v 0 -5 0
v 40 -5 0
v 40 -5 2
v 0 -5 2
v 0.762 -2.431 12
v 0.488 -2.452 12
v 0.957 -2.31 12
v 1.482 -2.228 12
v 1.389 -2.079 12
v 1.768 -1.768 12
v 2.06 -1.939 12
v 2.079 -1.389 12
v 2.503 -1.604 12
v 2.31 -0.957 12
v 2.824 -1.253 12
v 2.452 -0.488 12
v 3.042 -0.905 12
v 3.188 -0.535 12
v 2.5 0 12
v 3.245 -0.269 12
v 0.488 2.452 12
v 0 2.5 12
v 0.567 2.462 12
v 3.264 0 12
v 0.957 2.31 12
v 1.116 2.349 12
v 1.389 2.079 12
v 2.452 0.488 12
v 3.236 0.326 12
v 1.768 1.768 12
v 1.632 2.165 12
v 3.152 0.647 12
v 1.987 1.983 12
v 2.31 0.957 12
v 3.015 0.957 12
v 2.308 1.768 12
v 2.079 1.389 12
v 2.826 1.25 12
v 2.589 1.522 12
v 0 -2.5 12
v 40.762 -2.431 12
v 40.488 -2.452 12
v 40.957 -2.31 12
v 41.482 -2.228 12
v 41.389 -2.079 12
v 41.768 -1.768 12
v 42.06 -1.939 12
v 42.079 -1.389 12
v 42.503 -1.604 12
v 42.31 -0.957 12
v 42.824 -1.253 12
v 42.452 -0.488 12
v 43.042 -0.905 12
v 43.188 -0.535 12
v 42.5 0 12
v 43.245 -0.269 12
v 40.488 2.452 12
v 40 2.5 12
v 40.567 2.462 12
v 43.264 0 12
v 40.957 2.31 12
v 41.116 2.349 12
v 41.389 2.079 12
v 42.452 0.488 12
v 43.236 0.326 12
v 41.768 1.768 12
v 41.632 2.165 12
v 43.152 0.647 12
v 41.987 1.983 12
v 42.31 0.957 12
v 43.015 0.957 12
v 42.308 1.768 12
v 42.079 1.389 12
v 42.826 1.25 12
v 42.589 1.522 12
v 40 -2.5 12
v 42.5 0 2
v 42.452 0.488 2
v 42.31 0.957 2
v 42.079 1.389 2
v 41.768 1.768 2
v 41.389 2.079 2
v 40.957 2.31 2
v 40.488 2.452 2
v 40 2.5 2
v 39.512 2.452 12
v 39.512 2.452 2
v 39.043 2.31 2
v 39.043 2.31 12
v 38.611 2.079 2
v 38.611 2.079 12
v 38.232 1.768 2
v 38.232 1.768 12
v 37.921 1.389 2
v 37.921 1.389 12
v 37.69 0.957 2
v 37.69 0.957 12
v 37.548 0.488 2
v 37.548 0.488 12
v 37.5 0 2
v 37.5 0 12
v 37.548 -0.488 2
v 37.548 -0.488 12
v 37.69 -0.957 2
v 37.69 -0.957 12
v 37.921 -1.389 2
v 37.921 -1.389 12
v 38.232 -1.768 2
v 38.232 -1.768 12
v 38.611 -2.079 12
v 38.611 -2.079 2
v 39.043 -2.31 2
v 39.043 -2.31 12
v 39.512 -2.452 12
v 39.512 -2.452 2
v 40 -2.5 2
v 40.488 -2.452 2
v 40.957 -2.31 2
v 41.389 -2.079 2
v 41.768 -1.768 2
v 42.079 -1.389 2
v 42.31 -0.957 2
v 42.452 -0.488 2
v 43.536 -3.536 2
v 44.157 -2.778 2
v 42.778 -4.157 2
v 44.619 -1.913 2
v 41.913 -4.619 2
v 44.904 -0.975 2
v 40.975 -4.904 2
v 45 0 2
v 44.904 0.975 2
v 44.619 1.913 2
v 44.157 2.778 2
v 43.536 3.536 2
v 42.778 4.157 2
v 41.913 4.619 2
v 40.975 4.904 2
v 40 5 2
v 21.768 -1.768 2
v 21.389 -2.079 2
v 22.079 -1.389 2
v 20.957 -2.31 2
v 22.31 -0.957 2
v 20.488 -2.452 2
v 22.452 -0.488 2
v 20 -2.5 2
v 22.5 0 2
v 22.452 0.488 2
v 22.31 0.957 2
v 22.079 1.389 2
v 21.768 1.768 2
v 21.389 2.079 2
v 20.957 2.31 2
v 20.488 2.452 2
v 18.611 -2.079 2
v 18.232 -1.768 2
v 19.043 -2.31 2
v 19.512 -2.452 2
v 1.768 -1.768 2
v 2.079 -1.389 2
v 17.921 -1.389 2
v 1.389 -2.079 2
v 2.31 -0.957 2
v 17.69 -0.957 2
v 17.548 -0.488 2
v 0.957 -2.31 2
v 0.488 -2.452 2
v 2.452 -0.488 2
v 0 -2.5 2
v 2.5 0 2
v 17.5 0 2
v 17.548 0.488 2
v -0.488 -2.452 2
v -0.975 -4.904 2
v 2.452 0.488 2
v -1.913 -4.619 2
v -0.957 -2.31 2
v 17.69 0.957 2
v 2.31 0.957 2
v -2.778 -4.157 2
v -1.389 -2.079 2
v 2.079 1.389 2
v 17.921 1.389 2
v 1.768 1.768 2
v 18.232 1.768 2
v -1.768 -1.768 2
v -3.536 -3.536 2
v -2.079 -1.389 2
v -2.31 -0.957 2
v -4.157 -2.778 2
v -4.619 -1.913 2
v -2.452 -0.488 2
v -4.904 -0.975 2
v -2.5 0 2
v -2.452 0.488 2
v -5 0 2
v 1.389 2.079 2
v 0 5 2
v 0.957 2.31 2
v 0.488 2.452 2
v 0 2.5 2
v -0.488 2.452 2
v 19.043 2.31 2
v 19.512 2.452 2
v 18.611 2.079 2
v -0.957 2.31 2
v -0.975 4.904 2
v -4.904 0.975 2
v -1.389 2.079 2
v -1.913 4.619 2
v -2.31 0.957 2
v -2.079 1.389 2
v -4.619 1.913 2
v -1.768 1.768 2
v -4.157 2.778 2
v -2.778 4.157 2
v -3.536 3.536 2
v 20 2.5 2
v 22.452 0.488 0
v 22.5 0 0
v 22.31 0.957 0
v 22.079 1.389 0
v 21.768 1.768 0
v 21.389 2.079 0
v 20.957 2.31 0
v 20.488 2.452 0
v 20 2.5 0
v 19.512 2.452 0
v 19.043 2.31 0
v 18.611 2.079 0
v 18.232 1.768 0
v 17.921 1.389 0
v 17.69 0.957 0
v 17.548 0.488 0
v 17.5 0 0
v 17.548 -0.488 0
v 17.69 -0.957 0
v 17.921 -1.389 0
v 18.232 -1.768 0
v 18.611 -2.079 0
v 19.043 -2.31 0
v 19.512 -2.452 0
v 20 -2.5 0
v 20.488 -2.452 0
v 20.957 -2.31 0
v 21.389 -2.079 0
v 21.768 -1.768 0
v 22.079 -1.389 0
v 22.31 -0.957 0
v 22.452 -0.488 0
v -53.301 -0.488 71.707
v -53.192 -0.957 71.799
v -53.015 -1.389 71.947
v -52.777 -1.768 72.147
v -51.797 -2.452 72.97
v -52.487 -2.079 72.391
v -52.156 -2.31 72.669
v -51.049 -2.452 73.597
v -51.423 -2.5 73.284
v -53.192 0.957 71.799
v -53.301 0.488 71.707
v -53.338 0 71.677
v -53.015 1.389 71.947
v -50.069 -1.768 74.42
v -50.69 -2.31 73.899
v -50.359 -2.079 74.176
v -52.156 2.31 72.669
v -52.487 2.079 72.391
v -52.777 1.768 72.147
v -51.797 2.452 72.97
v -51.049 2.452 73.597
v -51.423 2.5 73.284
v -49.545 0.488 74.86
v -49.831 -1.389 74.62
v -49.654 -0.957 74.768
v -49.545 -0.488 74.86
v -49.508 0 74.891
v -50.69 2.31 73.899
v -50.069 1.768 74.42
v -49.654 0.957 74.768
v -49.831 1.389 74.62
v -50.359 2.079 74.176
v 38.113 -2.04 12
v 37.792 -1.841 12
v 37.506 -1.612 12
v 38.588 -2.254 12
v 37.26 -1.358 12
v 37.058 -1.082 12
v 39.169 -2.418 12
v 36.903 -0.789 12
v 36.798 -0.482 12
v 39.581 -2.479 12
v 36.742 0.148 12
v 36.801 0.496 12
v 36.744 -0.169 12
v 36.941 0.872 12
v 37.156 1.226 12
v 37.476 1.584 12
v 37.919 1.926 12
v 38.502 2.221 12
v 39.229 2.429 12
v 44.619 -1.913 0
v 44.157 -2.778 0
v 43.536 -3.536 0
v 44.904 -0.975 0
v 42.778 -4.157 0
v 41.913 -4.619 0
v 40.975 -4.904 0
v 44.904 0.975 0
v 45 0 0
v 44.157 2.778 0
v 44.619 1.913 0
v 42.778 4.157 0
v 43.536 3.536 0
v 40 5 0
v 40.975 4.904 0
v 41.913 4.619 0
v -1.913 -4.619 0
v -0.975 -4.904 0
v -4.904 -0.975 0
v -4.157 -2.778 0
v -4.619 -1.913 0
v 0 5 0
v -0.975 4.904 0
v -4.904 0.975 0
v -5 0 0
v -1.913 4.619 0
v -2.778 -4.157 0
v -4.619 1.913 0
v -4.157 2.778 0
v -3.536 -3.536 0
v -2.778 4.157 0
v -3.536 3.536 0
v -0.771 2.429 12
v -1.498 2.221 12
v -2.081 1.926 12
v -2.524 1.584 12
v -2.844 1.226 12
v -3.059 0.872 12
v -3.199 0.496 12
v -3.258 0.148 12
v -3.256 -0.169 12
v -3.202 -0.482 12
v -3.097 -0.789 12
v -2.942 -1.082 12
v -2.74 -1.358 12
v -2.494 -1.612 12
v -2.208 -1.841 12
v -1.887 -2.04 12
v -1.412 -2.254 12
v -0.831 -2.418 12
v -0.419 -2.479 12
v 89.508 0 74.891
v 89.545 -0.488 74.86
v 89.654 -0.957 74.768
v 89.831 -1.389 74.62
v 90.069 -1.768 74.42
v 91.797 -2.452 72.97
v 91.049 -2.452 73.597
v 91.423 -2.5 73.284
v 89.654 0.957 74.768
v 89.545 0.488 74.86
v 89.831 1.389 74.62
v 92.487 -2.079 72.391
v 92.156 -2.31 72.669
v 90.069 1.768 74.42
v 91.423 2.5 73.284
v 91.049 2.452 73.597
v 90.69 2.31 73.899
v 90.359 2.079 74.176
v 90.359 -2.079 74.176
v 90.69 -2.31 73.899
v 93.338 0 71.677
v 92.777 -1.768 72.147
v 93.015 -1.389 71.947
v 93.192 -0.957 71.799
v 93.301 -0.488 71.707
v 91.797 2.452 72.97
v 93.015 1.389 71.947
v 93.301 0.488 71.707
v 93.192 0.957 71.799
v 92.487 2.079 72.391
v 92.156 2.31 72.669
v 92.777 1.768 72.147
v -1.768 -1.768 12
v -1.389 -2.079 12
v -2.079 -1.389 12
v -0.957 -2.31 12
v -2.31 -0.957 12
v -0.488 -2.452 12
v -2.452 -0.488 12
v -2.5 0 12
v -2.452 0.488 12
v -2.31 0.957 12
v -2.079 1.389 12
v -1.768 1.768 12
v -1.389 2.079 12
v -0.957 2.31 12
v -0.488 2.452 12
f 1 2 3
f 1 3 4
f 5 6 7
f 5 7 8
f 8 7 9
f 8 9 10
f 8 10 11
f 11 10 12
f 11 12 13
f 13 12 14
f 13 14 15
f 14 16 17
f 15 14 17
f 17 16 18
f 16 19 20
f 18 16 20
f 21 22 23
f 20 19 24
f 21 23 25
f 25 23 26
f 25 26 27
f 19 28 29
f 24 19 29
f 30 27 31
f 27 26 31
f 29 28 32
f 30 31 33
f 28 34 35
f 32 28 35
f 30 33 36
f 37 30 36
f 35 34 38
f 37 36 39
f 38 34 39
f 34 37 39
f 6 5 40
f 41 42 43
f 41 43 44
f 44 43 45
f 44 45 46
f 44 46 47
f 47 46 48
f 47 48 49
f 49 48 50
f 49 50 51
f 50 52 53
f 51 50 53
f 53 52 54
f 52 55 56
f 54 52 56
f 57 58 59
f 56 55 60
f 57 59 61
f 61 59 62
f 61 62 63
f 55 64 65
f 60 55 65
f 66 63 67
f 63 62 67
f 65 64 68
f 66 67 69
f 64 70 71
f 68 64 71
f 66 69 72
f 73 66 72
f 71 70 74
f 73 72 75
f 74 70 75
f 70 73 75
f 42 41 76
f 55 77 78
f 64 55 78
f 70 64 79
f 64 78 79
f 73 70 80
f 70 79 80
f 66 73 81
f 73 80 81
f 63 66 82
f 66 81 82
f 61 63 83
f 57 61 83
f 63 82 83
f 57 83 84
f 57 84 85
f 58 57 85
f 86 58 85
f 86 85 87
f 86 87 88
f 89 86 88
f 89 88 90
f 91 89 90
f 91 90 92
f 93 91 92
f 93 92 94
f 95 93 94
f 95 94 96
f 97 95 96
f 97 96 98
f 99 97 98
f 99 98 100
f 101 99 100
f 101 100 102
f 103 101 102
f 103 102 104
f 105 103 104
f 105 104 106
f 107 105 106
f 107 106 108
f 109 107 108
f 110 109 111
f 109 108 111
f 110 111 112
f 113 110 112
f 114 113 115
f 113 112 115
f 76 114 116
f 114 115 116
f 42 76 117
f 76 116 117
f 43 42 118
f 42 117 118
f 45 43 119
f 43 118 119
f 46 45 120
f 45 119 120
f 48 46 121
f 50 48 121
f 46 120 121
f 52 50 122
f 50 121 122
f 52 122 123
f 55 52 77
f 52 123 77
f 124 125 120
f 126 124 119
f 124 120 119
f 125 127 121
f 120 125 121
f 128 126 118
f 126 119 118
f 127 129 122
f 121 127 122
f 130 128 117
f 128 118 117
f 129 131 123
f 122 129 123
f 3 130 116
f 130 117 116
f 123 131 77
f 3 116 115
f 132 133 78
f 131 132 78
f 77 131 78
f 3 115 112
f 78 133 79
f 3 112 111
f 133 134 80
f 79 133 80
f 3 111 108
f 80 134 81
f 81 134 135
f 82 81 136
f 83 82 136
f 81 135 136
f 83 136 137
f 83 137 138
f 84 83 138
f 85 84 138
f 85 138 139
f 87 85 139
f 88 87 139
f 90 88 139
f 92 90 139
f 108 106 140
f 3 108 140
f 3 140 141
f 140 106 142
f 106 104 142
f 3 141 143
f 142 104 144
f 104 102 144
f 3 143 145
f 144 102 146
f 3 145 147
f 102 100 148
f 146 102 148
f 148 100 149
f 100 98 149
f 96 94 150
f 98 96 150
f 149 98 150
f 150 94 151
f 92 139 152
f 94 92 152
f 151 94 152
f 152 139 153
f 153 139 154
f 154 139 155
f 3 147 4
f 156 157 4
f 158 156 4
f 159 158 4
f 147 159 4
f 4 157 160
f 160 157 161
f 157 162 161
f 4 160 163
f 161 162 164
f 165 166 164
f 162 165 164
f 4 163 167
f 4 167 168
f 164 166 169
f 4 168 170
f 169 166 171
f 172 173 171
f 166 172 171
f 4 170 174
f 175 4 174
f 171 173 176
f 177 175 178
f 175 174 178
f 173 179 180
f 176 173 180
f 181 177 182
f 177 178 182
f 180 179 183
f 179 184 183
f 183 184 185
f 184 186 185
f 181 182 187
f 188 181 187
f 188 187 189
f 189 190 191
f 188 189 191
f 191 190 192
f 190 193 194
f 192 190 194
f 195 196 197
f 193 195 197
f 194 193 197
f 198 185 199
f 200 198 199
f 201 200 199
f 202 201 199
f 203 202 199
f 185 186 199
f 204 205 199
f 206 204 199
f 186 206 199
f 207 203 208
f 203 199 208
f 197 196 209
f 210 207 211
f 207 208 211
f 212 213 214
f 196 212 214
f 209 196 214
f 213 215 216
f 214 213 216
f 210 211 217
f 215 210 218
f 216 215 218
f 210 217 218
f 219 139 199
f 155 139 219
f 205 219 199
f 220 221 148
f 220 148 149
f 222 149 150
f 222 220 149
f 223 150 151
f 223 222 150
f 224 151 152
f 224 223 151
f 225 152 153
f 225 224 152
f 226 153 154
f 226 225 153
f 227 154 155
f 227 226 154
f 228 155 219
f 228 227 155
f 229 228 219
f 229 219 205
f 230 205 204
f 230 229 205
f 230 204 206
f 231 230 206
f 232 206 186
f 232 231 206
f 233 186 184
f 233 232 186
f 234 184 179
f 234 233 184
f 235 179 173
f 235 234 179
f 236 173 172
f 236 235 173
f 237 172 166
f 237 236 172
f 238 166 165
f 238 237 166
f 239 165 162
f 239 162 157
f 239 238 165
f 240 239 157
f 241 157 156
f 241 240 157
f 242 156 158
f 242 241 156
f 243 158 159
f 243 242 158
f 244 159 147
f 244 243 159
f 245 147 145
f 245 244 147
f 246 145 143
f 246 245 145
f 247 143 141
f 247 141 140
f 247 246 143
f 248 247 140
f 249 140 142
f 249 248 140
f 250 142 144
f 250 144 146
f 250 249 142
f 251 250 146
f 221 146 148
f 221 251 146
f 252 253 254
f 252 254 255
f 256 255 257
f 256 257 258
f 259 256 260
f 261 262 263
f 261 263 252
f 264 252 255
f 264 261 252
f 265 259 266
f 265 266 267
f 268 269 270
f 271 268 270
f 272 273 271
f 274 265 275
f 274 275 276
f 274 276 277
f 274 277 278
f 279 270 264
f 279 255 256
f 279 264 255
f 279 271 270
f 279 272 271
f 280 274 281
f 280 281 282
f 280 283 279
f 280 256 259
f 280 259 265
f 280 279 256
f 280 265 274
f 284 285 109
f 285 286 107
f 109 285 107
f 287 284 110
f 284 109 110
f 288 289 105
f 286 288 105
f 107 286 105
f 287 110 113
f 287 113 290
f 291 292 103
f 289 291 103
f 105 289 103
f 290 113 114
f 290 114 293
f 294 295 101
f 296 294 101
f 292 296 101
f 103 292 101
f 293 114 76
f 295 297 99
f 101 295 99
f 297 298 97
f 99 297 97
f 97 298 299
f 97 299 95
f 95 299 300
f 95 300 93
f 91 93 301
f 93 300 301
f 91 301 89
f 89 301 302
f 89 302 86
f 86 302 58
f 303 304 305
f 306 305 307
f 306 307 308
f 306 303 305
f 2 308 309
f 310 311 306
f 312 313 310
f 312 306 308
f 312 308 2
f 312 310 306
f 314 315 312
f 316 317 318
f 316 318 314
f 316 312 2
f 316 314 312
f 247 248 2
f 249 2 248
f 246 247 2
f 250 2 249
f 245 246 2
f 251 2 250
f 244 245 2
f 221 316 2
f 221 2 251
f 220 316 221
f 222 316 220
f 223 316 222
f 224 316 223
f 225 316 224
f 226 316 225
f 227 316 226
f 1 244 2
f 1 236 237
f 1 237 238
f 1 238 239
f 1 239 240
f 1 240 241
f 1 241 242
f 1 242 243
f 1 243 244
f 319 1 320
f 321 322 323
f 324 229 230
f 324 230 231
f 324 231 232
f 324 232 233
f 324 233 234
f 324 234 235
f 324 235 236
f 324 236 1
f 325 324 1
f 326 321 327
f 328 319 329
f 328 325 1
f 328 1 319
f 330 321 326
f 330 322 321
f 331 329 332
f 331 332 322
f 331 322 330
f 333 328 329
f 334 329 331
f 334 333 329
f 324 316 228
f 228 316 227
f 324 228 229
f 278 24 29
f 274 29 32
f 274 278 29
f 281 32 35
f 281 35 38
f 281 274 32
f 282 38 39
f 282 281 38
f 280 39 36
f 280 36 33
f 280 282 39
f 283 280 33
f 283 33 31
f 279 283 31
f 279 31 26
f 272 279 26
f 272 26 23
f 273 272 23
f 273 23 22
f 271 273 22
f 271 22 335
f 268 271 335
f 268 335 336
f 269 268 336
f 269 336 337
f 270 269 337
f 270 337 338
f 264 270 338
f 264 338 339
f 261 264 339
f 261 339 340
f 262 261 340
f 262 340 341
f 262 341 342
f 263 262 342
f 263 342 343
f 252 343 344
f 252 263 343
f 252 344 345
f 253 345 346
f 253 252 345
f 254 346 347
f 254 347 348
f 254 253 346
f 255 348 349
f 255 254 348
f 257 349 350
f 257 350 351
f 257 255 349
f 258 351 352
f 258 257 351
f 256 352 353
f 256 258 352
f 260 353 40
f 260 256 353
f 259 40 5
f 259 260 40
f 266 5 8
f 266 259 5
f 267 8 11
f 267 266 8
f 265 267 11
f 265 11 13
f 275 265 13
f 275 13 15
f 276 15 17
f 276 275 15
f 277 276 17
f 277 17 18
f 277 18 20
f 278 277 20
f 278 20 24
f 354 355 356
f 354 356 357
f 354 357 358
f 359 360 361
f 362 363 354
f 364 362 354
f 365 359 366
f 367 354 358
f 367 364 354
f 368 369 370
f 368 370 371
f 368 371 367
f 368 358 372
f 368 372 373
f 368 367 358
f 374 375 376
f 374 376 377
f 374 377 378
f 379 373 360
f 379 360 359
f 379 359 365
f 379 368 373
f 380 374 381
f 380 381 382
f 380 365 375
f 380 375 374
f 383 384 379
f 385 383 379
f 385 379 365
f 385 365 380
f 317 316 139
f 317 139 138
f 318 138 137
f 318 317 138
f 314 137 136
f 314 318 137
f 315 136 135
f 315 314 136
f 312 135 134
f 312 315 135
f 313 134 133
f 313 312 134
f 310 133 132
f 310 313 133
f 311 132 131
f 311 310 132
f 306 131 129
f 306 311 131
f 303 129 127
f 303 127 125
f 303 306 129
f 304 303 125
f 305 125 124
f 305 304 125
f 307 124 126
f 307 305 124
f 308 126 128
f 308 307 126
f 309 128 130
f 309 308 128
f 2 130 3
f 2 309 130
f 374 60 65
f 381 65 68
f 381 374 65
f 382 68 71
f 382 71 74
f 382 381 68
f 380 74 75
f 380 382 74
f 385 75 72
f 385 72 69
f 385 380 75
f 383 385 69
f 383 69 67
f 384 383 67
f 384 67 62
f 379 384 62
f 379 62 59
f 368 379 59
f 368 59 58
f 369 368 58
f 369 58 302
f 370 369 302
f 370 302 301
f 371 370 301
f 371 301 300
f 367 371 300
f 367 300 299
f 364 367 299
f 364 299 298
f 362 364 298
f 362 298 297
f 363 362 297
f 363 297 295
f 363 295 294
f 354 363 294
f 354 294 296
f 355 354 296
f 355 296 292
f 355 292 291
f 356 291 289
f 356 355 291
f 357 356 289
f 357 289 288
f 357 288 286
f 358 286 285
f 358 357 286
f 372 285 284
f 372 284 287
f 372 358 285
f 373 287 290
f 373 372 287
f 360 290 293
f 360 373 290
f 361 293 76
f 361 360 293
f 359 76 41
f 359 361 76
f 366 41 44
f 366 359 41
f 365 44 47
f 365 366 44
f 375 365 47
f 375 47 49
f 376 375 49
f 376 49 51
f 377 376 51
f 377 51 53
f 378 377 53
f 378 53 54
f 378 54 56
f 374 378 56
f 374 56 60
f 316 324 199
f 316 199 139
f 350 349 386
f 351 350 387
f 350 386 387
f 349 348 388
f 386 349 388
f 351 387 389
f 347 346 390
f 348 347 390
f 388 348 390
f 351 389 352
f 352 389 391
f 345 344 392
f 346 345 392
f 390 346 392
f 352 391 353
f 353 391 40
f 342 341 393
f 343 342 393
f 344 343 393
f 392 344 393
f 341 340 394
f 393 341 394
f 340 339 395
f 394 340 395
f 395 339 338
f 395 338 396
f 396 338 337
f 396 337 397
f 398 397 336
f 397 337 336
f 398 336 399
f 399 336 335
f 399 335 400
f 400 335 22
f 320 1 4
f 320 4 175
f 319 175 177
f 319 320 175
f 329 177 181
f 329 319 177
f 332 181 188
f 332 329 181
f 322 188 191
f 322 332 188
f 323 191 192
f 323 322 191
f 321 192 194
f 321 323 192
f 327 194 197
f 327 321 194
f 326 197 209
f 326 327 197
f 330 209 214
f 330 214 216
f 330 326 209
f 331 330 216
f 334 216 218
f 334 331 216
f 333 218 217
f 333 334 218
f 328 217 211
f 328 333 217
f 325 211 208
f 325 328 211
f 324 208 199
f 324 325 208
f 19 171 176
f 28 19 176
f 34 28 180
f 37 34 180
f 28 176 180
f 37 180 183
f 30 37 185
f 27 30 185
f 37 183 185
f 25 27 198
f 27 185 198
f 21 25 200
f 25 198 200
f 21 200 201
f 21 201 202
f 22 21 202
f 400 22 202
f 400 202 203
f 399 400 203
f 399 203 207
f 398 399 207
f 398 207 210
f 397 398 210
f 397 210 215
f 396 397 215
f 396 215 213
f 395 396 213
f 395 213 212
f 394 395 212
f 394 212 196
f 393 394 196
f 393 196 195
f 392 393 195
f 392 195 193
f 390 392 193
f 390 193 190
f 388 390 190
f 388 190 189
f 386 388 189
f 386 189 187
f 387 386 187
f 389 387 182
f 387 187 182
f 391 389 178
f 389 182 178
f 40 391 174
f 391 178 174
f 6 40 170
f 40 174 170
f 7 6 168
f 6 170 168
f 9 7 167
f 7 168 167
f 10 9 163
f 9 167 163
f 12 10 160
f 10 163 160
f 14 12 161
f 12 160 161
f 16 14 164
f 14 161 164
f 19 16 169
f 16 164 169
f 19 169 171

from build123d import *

# Parameters (mm, degrees)
SKETCH1_R           = 2.5
BOSS_EXTRUDE1_DEPTH = 2
SKETCH2_R           = 2.5
BOSS_EXTRUDE2_DEPTH = 10
BOSS_EXTRUDE3_REACH = 123.214
SKETCH4_R           = 2.5
BOSS_EXTRUDE4_REACH = 164.331
SKETCH5_R           = 2.5


with BuildPart() as part:
    # Sketch1 → Boss-Extrude1 (new body)
    with BuildSketch(Plane.XY):
        with BuildLine():
            Line((0, 5), (40, 5))
            ThreePointArc((40, 5), (45, 0), (40, -5))
            Line((40, -5), (0, -5))
            ThreePointArc((0, -5), (-5, 0), (0, 5))
        make_face()
        with Locations((20, 0)):
            Circle(SKETCH1_R, mode=Mode.SUBTRACT)
    extrude(amount=BOSS_EXTRUDE1_DEPTH)

    # Sketch2 → Boss-Extrude2 (add)
    with BuildSketch(Plane.XY.offset(2)):
        Circle(SKETCH2_R)
        with Locations((40, 0)):
            Circle(SKETCH2_R)
    extrude(amount=BOSS_EXTRUDE2_DEPTH)

    # Boss-Extrude3: up to this plane
    boss_extrude3_end = Plane(origin=(0, 0, 12), z_dir=(0, 0, 1))
    # Sketch4 → Boss-Extrude3 (add, up to the surface)
    with BuildSketch(Plane(origin=(-51.423008775, 0, 73.28355545), x_dir=(0.7660444431189768, 0, 0.6427876096865409), z_dir=(-0.6427876096865408, 0, 0.7660444431189767)), mode=Mode.PRIVATE) as boss_extrude3_sk1:
        Circle(SKETCH4_R)
    boss_extrude3_tool1 = split(extrude(boss_extrude3_sk1.sketch, amount=-BOSS_EXTRUDE3_REACH, mode=Mode.PRIVATE), bisect_by=boss_extrude3_end, keep=Keep.BOTH, mode=Mode.PRIVATE)
    add(boss_extrude3_tool1.solids().sort_by_distance((-51.423009, 0, 73.283555))[0])

    # Boss-Extrude4: up to this plane
    boss_extrude4_end = Plane(origin=(40, 0, 12), z_dir=(0, 0, 1))
    # Sketch5 → Boss-Extrude4 (add, up to the surface)
    with BuildSketch(Plane(origin=(91.423008775, 0, 73.28355545), x_dir=(0.7660444431189772, 0, -0.6427876096865404), z_dir=(0.6427876096865403, 0, 0.7660444431189771)), mode=Mode.PRIVATE) as boss_extrude4_sk1:
        Circle(SKETCH5_R)
    boss_extrude4_tool1 = split(extrude(boss_extrude4_sk1.sketch, amount=-BOSS_EXTRUDE4_REACH, mode=Mode.PRIVATE), bisect_by=boss_extrude4_end, keep=Keep.BOTH, mode=Mode.PRIVATE)
    add(boss_extrude4_tool1.solids().sort_by_distance((91.423009, 0, 73.283555))[0])


solid = part.part
